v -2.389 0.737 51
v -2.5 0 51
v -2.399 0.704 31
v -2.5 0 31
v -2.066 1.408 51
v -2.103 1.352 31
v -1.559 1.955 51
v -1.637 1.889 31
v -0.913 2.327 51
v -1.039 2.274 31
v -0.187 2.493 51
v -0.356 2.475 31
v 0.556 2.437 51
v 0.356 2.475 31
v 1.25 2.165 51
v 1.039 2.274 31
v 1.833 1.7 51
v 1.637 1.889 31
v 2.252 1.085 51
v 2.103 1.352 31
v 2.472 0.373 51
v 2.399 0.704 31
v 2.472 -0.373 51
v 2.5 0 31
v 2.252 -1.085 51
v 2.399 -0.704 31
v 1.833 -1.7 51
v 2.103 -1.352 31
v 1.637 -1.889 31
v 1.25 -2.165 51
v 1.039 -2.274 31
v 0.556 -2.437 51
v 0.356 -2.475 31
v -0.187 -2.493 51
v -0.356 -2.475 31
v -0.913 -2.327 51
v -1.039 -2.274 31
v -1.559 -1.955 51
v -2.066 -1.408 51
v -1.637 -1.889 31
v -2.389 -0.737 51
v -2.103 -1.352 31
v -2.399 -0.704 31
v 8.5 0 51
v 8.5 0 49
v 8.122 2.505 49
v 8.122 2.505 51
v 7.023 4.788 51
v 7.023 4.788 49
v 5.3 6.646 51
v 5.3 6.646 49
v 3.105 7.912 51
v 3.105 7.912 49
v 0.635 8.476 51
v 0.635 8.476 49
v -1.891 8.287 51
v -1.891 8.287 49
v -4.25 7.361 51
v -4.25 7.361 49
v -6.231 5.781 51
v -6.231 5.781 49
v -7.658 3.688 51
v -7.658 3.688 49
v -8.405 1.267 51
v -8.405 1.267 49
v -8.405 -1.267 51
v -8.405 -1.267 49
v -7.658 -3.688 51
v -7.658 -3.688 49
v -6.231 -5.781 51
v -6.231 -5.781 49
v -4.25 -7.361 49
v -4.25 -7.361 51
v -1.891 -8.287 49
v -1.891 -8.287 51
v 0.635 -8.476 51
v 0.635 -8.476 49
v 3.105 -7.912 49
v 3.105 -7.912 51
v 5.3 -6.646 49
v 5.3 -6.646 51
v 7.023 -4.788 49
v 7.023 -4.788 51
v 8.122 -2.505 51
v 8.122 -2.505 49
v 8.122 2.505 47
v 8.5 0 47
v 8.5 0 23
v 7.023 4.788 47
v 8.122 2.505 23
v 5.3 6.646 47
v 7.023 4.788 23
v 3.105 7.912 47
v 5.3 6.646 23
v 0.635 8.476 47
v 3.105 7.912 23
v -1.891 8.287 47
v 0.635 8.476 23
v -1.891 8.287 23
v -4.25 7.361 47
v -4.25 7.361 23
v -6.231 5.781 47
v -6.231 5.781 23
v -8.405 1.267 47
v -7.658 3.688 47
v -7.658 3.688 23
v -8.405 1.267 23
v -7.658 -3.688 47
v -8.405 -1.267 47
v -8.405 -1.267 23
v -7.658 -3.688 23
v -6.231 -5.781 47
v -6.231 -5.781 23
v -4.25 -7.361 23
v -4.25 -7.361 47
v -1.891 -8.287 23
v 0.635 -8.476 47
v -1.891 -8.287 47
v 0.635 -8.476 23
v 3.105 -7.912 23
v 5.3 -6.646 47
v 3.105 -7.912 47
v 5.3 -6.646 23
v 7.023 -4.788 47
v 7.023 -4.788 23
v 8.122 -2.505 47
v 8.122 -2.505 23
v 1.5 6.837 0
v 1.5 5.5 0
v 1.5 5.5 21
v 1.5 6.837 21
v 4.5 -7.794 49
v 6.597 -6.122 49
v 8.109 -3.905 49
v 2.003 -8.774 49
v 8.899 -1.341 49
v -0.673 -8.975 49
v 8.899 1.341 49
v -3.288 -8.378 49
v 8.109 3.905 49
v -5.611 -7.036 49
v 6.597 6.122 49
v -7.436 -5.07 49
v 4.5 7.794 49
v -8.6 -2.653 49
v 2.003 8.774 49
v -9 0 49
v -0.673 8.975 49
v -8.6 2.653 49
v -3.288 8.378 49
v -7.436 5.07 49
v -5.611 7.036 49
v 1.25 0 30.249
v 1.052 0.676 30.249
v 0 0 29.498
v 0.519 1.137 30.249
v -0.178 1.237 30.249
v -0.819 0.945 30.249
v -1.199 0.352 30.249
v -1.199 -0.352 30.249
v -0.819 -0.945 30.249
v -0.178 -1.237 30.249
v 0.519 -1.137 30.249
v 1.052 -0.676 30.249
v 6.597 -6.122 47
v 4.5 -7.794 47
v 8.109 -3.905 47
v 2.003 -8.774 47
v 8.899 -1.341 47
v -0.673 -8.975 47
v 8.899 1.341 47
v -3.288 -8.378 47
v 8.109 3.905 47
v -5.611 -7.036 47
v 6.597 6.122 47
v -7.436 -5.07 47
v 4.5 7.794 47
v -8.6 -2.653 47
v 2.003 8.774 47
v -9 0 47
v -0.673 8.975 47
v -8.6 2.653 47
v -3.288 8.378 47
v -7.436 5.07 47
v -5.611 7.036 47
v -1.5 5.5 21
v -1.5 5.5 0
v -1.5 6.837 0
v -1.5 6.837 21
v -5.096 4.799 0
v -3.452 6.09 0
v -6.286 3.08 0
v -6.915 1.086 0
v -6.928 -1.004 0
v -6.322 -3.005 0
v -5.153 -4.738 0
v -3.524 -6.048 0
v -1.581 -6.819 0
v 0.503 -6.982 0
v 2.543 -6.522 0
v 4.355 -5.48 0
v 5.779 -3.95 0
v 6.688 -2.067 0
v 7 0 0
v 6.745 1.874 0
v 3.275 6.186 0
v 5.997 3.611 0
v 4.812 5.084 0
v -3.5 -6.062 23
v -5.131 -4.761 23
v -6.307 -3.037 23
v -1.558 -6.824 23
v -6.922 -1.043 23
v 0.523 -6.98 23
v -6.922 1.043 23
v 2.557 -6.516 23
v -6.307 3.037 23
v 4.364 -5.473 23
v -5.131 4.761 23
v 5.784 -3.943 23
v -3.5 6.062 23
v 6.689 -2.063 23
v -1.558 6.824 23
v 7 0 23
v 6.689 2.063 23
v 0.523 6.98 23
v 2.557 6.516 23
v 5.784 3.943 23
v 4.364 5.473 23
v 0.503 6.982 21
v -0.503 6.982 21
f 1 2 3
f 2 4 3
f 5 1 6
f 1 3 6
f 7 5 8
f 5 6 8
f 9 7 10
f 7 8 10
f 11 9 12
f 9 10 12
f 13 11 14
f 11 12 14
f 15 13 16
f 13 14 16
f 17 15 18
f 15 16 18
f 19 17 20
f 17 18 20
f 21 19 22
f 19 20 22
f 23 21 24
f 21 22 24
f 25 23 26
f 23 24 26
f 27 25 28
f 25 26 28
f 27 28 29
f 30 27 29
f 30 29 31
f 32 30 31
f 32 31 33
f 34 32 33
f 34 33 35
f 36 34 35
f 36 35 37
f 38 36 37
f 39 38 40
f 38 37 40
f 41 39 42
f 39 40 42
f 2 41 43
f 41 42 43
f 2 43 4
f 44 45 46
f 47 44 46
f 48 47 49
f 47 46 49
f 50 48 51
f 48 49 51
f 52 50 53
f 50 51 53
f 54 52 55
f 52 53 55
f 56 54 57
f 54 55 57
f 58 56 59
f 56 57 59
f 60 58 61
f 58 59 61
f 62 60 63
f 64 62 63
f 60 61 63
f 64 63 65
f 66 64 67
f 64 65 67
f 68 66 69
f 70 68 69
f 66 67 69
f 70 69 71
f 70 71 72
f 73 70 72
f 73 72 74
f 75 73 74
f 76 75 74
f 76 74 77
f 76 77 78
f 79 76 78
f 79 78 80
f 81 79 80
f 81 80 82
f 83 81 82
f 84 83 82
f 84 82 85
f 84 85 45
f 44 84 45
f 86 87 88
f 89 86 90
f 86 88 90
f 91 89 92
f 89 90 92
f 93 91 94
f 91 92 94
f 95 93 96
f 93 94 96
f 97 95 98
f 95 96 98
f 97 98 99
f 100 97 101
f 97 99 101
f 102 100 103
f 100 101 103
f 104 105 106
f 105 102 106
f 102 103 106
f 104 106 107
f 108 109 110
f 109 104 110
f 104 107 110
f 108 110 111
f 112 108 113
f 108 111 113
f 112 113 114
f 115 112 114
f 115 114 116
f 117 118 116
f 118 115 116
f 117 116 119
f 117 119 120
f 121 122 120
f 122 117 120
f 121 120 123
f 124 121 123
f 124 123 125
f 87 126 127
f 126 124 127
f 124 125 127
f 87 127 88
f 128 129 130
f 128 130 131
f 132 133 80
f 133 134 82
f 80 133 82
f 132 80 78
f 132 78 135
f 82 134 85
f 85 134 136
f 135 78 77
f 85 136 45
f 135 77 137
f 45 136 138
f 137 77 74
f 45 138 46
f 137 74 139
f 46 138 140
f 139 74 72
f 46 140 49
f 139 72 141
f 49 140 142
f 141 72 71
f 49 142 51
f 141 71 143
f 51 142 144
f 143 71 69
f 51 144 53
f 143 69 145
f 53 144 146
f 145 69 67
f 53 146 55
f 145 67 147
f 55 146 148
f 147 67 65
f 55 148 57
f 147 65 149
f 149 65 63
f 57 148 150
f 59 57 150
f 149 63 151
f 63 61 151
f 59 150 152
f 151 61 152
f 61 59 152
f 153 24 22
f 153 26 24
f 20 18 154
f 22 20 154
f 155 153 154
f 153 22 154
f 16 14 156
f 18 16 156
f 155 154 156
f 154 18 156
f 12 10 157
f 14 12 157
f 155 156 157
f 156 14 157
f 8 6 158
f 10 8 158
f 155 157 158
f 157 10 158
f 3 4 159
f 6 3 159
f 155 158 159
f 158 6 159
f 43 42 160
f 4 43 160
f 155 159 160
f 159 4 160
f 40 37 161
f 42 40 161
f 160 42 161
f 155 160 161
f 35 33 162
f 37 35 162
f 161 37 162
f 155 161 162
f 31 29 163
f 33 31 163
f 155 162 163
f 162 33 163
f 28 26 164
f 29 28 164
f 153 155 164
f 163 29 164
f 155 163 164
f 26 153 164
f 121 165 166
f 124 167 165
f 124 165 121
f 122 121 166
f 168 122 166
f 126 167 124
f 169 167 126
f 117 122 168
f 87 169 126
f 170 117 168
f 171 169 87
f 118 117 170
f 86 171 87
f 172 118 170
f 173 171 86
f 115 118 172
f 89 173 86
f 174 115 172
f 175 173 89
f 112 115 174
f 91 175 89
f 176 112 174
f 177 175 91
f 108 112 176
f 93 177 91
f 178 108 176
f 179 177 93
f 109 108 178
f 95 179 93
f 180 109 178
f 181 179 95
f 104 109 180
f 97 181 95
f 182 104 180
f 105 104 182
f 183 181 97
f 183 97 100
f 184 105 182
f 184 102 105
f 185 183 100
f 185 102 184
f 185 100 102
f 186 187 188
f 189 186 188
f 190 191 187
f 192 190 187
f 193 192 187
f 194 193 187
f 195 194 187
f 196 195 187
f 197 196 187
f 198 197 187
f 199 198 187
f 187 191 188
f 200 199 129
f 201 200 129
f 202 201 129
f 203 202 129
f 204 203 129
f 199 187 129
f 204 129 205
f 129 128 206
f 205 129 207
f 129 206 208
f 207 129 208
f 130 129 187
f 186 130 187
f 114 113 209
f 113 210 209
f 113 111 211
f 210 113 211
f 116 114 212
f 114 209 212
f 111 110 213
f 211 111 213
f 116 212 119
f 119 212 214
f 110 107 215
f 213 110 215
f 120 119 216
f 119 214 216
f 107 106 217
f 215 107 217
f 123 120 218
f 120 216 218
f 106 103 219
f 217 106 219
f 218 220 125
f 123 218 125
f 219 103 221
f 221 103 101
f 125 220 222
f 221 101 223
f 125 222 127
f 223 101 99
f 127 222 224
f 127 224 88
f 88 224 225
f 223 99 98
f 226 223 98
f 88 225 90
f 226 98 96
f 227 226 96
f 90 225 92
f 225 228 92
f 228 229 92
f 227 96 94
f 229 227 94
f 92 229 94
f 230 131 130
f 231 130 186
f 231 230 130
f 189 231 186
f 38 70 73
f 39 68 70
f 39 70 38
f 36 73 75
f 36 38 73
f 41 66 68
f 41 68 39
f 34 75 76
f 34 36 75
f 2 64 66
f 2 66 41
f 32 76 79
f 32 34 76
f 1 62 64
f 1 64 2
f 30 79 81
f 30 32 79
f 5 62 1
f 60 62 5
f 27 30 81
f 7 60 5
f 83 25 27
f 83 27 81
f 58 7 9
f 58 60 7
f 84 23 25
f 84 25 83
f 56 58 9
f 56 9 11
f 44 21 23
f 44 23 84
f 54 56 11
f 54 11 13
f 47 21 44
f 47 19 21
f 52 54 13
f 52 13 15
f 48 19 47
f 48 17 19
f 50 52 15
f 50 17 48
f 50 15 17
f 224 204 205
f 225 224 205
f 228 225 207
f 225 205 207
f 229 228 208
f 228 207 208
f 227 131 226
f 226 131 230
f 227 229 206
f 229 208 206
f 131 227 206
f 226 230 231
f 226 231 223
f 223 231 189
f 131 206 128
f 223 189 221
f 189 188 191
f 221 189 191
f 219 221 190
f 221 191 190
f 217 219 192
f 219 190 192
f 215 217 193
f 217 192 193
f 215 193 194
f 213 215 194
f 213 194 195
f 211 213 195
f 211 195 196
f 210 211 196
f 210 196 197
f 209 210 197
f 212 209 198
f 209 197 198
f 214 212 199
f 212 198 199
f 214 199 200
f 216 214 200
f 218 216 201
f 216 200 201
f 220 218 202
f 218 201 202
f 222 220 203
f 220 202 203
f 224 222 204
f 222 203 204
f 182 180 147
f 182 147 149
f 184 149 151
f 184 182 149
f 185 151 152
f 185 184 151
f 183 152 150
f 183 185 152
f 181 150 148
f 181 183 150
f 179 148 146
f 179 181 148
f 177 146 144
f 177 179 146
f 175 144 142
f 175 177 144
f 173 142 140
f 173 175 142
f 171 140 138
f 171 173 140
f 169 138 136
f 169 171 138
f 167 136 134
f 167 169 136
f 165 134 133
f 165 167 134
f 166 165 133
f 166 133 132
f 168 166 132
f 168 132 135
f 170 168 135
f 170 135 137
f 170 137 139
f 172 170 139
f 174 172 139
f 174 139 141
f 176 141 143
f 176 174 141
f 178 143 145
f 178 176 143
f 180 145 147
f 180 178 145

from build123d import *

# Parameters (mm, degrees)
SKETCH1_R                 = 7
BOSS_EXTRUDE1_DEPTH       = 23
SKETCH3_W                 = 3
SKETCH3_H                 = 3
CUT_EXTRUDE1_DEPTH        = 21
SKETCH6_R                 = 8.5
BOSS_EXTRUDE2_DEPTH       = 28
SKETCH7_R                 = 9
BOSS_EXTRUDE3_DEPTH       = 2
M6X1_0_TAPPED_HOLE1_D     = 5
M6X1_0_TAPPED_HOLE1_DEPTH = 20
M6X1_0_TAPPED_HOLE1_TIP   = 1.502151548


with BuildPart() as part:
    # Sketch1 → Boss-Extrude1 (new body)
    with BuildSketch(Plane.XY):
        Circle(SKETCH1_R)
    extrude(amount=BOSS_EXTRUDE1_DEPTH)

    # Sketch3 → Cut-Extrude1 (cut)
    with BuildSketch(Plane(origin=(0, 0, 0), x_dir=(-1, 0, 0), z_dir=(0, 0, -1))):
        with Locations((0, 7)):
            Rectangle(SKETCH3_W, SKETCH3_H)
    extrude(amount=-CUT_EXTRUDE1_DEPTH, mode=Mode.SUBTRACT)

    # Sketch6 → Boss-Extrude2 (add)
    with BuildSketch(Plane.XY.offset(23)):
        Circle(SKETCH6_R)
    extrude(amount=BOSS_EXTRUDE2_DEPTH)

    # Sketch7 → Boss-Extrude3 (add)
    with BuildSketch(Plane(origin=(0, 0, 47), x_dir=(-1, 0, 0), z_dir=(0, 0, -1))):
        Circle(SKETCH7_R)
    extrude(amount=-BOSS_EXTRUDE3_DEPTH)

    # M6x1.0 Tapped Hole1
    with Locations(Plane.XY.offset(51)):
        with Locations((0, 0)):
            Hole(M6X1_0_TAPPED_HOLE1_D / 2, depth=M6X1_0_TAPPED_HOLE1_DEPTH)
            with Locations((0, 0, -(M6X1_0_TAPPED_HOLE1_DEPTH + M6X1_0_TAPPED_HOLE1_TIP / 2))):  # 118° drill point
                Cone(0, M6X1_0_TAPPED_HOLE1_D / 2, M6X1_0_TAPPED_HOLE1_TIP, mode=Mode.SUBTRACT)


solid = part.part
